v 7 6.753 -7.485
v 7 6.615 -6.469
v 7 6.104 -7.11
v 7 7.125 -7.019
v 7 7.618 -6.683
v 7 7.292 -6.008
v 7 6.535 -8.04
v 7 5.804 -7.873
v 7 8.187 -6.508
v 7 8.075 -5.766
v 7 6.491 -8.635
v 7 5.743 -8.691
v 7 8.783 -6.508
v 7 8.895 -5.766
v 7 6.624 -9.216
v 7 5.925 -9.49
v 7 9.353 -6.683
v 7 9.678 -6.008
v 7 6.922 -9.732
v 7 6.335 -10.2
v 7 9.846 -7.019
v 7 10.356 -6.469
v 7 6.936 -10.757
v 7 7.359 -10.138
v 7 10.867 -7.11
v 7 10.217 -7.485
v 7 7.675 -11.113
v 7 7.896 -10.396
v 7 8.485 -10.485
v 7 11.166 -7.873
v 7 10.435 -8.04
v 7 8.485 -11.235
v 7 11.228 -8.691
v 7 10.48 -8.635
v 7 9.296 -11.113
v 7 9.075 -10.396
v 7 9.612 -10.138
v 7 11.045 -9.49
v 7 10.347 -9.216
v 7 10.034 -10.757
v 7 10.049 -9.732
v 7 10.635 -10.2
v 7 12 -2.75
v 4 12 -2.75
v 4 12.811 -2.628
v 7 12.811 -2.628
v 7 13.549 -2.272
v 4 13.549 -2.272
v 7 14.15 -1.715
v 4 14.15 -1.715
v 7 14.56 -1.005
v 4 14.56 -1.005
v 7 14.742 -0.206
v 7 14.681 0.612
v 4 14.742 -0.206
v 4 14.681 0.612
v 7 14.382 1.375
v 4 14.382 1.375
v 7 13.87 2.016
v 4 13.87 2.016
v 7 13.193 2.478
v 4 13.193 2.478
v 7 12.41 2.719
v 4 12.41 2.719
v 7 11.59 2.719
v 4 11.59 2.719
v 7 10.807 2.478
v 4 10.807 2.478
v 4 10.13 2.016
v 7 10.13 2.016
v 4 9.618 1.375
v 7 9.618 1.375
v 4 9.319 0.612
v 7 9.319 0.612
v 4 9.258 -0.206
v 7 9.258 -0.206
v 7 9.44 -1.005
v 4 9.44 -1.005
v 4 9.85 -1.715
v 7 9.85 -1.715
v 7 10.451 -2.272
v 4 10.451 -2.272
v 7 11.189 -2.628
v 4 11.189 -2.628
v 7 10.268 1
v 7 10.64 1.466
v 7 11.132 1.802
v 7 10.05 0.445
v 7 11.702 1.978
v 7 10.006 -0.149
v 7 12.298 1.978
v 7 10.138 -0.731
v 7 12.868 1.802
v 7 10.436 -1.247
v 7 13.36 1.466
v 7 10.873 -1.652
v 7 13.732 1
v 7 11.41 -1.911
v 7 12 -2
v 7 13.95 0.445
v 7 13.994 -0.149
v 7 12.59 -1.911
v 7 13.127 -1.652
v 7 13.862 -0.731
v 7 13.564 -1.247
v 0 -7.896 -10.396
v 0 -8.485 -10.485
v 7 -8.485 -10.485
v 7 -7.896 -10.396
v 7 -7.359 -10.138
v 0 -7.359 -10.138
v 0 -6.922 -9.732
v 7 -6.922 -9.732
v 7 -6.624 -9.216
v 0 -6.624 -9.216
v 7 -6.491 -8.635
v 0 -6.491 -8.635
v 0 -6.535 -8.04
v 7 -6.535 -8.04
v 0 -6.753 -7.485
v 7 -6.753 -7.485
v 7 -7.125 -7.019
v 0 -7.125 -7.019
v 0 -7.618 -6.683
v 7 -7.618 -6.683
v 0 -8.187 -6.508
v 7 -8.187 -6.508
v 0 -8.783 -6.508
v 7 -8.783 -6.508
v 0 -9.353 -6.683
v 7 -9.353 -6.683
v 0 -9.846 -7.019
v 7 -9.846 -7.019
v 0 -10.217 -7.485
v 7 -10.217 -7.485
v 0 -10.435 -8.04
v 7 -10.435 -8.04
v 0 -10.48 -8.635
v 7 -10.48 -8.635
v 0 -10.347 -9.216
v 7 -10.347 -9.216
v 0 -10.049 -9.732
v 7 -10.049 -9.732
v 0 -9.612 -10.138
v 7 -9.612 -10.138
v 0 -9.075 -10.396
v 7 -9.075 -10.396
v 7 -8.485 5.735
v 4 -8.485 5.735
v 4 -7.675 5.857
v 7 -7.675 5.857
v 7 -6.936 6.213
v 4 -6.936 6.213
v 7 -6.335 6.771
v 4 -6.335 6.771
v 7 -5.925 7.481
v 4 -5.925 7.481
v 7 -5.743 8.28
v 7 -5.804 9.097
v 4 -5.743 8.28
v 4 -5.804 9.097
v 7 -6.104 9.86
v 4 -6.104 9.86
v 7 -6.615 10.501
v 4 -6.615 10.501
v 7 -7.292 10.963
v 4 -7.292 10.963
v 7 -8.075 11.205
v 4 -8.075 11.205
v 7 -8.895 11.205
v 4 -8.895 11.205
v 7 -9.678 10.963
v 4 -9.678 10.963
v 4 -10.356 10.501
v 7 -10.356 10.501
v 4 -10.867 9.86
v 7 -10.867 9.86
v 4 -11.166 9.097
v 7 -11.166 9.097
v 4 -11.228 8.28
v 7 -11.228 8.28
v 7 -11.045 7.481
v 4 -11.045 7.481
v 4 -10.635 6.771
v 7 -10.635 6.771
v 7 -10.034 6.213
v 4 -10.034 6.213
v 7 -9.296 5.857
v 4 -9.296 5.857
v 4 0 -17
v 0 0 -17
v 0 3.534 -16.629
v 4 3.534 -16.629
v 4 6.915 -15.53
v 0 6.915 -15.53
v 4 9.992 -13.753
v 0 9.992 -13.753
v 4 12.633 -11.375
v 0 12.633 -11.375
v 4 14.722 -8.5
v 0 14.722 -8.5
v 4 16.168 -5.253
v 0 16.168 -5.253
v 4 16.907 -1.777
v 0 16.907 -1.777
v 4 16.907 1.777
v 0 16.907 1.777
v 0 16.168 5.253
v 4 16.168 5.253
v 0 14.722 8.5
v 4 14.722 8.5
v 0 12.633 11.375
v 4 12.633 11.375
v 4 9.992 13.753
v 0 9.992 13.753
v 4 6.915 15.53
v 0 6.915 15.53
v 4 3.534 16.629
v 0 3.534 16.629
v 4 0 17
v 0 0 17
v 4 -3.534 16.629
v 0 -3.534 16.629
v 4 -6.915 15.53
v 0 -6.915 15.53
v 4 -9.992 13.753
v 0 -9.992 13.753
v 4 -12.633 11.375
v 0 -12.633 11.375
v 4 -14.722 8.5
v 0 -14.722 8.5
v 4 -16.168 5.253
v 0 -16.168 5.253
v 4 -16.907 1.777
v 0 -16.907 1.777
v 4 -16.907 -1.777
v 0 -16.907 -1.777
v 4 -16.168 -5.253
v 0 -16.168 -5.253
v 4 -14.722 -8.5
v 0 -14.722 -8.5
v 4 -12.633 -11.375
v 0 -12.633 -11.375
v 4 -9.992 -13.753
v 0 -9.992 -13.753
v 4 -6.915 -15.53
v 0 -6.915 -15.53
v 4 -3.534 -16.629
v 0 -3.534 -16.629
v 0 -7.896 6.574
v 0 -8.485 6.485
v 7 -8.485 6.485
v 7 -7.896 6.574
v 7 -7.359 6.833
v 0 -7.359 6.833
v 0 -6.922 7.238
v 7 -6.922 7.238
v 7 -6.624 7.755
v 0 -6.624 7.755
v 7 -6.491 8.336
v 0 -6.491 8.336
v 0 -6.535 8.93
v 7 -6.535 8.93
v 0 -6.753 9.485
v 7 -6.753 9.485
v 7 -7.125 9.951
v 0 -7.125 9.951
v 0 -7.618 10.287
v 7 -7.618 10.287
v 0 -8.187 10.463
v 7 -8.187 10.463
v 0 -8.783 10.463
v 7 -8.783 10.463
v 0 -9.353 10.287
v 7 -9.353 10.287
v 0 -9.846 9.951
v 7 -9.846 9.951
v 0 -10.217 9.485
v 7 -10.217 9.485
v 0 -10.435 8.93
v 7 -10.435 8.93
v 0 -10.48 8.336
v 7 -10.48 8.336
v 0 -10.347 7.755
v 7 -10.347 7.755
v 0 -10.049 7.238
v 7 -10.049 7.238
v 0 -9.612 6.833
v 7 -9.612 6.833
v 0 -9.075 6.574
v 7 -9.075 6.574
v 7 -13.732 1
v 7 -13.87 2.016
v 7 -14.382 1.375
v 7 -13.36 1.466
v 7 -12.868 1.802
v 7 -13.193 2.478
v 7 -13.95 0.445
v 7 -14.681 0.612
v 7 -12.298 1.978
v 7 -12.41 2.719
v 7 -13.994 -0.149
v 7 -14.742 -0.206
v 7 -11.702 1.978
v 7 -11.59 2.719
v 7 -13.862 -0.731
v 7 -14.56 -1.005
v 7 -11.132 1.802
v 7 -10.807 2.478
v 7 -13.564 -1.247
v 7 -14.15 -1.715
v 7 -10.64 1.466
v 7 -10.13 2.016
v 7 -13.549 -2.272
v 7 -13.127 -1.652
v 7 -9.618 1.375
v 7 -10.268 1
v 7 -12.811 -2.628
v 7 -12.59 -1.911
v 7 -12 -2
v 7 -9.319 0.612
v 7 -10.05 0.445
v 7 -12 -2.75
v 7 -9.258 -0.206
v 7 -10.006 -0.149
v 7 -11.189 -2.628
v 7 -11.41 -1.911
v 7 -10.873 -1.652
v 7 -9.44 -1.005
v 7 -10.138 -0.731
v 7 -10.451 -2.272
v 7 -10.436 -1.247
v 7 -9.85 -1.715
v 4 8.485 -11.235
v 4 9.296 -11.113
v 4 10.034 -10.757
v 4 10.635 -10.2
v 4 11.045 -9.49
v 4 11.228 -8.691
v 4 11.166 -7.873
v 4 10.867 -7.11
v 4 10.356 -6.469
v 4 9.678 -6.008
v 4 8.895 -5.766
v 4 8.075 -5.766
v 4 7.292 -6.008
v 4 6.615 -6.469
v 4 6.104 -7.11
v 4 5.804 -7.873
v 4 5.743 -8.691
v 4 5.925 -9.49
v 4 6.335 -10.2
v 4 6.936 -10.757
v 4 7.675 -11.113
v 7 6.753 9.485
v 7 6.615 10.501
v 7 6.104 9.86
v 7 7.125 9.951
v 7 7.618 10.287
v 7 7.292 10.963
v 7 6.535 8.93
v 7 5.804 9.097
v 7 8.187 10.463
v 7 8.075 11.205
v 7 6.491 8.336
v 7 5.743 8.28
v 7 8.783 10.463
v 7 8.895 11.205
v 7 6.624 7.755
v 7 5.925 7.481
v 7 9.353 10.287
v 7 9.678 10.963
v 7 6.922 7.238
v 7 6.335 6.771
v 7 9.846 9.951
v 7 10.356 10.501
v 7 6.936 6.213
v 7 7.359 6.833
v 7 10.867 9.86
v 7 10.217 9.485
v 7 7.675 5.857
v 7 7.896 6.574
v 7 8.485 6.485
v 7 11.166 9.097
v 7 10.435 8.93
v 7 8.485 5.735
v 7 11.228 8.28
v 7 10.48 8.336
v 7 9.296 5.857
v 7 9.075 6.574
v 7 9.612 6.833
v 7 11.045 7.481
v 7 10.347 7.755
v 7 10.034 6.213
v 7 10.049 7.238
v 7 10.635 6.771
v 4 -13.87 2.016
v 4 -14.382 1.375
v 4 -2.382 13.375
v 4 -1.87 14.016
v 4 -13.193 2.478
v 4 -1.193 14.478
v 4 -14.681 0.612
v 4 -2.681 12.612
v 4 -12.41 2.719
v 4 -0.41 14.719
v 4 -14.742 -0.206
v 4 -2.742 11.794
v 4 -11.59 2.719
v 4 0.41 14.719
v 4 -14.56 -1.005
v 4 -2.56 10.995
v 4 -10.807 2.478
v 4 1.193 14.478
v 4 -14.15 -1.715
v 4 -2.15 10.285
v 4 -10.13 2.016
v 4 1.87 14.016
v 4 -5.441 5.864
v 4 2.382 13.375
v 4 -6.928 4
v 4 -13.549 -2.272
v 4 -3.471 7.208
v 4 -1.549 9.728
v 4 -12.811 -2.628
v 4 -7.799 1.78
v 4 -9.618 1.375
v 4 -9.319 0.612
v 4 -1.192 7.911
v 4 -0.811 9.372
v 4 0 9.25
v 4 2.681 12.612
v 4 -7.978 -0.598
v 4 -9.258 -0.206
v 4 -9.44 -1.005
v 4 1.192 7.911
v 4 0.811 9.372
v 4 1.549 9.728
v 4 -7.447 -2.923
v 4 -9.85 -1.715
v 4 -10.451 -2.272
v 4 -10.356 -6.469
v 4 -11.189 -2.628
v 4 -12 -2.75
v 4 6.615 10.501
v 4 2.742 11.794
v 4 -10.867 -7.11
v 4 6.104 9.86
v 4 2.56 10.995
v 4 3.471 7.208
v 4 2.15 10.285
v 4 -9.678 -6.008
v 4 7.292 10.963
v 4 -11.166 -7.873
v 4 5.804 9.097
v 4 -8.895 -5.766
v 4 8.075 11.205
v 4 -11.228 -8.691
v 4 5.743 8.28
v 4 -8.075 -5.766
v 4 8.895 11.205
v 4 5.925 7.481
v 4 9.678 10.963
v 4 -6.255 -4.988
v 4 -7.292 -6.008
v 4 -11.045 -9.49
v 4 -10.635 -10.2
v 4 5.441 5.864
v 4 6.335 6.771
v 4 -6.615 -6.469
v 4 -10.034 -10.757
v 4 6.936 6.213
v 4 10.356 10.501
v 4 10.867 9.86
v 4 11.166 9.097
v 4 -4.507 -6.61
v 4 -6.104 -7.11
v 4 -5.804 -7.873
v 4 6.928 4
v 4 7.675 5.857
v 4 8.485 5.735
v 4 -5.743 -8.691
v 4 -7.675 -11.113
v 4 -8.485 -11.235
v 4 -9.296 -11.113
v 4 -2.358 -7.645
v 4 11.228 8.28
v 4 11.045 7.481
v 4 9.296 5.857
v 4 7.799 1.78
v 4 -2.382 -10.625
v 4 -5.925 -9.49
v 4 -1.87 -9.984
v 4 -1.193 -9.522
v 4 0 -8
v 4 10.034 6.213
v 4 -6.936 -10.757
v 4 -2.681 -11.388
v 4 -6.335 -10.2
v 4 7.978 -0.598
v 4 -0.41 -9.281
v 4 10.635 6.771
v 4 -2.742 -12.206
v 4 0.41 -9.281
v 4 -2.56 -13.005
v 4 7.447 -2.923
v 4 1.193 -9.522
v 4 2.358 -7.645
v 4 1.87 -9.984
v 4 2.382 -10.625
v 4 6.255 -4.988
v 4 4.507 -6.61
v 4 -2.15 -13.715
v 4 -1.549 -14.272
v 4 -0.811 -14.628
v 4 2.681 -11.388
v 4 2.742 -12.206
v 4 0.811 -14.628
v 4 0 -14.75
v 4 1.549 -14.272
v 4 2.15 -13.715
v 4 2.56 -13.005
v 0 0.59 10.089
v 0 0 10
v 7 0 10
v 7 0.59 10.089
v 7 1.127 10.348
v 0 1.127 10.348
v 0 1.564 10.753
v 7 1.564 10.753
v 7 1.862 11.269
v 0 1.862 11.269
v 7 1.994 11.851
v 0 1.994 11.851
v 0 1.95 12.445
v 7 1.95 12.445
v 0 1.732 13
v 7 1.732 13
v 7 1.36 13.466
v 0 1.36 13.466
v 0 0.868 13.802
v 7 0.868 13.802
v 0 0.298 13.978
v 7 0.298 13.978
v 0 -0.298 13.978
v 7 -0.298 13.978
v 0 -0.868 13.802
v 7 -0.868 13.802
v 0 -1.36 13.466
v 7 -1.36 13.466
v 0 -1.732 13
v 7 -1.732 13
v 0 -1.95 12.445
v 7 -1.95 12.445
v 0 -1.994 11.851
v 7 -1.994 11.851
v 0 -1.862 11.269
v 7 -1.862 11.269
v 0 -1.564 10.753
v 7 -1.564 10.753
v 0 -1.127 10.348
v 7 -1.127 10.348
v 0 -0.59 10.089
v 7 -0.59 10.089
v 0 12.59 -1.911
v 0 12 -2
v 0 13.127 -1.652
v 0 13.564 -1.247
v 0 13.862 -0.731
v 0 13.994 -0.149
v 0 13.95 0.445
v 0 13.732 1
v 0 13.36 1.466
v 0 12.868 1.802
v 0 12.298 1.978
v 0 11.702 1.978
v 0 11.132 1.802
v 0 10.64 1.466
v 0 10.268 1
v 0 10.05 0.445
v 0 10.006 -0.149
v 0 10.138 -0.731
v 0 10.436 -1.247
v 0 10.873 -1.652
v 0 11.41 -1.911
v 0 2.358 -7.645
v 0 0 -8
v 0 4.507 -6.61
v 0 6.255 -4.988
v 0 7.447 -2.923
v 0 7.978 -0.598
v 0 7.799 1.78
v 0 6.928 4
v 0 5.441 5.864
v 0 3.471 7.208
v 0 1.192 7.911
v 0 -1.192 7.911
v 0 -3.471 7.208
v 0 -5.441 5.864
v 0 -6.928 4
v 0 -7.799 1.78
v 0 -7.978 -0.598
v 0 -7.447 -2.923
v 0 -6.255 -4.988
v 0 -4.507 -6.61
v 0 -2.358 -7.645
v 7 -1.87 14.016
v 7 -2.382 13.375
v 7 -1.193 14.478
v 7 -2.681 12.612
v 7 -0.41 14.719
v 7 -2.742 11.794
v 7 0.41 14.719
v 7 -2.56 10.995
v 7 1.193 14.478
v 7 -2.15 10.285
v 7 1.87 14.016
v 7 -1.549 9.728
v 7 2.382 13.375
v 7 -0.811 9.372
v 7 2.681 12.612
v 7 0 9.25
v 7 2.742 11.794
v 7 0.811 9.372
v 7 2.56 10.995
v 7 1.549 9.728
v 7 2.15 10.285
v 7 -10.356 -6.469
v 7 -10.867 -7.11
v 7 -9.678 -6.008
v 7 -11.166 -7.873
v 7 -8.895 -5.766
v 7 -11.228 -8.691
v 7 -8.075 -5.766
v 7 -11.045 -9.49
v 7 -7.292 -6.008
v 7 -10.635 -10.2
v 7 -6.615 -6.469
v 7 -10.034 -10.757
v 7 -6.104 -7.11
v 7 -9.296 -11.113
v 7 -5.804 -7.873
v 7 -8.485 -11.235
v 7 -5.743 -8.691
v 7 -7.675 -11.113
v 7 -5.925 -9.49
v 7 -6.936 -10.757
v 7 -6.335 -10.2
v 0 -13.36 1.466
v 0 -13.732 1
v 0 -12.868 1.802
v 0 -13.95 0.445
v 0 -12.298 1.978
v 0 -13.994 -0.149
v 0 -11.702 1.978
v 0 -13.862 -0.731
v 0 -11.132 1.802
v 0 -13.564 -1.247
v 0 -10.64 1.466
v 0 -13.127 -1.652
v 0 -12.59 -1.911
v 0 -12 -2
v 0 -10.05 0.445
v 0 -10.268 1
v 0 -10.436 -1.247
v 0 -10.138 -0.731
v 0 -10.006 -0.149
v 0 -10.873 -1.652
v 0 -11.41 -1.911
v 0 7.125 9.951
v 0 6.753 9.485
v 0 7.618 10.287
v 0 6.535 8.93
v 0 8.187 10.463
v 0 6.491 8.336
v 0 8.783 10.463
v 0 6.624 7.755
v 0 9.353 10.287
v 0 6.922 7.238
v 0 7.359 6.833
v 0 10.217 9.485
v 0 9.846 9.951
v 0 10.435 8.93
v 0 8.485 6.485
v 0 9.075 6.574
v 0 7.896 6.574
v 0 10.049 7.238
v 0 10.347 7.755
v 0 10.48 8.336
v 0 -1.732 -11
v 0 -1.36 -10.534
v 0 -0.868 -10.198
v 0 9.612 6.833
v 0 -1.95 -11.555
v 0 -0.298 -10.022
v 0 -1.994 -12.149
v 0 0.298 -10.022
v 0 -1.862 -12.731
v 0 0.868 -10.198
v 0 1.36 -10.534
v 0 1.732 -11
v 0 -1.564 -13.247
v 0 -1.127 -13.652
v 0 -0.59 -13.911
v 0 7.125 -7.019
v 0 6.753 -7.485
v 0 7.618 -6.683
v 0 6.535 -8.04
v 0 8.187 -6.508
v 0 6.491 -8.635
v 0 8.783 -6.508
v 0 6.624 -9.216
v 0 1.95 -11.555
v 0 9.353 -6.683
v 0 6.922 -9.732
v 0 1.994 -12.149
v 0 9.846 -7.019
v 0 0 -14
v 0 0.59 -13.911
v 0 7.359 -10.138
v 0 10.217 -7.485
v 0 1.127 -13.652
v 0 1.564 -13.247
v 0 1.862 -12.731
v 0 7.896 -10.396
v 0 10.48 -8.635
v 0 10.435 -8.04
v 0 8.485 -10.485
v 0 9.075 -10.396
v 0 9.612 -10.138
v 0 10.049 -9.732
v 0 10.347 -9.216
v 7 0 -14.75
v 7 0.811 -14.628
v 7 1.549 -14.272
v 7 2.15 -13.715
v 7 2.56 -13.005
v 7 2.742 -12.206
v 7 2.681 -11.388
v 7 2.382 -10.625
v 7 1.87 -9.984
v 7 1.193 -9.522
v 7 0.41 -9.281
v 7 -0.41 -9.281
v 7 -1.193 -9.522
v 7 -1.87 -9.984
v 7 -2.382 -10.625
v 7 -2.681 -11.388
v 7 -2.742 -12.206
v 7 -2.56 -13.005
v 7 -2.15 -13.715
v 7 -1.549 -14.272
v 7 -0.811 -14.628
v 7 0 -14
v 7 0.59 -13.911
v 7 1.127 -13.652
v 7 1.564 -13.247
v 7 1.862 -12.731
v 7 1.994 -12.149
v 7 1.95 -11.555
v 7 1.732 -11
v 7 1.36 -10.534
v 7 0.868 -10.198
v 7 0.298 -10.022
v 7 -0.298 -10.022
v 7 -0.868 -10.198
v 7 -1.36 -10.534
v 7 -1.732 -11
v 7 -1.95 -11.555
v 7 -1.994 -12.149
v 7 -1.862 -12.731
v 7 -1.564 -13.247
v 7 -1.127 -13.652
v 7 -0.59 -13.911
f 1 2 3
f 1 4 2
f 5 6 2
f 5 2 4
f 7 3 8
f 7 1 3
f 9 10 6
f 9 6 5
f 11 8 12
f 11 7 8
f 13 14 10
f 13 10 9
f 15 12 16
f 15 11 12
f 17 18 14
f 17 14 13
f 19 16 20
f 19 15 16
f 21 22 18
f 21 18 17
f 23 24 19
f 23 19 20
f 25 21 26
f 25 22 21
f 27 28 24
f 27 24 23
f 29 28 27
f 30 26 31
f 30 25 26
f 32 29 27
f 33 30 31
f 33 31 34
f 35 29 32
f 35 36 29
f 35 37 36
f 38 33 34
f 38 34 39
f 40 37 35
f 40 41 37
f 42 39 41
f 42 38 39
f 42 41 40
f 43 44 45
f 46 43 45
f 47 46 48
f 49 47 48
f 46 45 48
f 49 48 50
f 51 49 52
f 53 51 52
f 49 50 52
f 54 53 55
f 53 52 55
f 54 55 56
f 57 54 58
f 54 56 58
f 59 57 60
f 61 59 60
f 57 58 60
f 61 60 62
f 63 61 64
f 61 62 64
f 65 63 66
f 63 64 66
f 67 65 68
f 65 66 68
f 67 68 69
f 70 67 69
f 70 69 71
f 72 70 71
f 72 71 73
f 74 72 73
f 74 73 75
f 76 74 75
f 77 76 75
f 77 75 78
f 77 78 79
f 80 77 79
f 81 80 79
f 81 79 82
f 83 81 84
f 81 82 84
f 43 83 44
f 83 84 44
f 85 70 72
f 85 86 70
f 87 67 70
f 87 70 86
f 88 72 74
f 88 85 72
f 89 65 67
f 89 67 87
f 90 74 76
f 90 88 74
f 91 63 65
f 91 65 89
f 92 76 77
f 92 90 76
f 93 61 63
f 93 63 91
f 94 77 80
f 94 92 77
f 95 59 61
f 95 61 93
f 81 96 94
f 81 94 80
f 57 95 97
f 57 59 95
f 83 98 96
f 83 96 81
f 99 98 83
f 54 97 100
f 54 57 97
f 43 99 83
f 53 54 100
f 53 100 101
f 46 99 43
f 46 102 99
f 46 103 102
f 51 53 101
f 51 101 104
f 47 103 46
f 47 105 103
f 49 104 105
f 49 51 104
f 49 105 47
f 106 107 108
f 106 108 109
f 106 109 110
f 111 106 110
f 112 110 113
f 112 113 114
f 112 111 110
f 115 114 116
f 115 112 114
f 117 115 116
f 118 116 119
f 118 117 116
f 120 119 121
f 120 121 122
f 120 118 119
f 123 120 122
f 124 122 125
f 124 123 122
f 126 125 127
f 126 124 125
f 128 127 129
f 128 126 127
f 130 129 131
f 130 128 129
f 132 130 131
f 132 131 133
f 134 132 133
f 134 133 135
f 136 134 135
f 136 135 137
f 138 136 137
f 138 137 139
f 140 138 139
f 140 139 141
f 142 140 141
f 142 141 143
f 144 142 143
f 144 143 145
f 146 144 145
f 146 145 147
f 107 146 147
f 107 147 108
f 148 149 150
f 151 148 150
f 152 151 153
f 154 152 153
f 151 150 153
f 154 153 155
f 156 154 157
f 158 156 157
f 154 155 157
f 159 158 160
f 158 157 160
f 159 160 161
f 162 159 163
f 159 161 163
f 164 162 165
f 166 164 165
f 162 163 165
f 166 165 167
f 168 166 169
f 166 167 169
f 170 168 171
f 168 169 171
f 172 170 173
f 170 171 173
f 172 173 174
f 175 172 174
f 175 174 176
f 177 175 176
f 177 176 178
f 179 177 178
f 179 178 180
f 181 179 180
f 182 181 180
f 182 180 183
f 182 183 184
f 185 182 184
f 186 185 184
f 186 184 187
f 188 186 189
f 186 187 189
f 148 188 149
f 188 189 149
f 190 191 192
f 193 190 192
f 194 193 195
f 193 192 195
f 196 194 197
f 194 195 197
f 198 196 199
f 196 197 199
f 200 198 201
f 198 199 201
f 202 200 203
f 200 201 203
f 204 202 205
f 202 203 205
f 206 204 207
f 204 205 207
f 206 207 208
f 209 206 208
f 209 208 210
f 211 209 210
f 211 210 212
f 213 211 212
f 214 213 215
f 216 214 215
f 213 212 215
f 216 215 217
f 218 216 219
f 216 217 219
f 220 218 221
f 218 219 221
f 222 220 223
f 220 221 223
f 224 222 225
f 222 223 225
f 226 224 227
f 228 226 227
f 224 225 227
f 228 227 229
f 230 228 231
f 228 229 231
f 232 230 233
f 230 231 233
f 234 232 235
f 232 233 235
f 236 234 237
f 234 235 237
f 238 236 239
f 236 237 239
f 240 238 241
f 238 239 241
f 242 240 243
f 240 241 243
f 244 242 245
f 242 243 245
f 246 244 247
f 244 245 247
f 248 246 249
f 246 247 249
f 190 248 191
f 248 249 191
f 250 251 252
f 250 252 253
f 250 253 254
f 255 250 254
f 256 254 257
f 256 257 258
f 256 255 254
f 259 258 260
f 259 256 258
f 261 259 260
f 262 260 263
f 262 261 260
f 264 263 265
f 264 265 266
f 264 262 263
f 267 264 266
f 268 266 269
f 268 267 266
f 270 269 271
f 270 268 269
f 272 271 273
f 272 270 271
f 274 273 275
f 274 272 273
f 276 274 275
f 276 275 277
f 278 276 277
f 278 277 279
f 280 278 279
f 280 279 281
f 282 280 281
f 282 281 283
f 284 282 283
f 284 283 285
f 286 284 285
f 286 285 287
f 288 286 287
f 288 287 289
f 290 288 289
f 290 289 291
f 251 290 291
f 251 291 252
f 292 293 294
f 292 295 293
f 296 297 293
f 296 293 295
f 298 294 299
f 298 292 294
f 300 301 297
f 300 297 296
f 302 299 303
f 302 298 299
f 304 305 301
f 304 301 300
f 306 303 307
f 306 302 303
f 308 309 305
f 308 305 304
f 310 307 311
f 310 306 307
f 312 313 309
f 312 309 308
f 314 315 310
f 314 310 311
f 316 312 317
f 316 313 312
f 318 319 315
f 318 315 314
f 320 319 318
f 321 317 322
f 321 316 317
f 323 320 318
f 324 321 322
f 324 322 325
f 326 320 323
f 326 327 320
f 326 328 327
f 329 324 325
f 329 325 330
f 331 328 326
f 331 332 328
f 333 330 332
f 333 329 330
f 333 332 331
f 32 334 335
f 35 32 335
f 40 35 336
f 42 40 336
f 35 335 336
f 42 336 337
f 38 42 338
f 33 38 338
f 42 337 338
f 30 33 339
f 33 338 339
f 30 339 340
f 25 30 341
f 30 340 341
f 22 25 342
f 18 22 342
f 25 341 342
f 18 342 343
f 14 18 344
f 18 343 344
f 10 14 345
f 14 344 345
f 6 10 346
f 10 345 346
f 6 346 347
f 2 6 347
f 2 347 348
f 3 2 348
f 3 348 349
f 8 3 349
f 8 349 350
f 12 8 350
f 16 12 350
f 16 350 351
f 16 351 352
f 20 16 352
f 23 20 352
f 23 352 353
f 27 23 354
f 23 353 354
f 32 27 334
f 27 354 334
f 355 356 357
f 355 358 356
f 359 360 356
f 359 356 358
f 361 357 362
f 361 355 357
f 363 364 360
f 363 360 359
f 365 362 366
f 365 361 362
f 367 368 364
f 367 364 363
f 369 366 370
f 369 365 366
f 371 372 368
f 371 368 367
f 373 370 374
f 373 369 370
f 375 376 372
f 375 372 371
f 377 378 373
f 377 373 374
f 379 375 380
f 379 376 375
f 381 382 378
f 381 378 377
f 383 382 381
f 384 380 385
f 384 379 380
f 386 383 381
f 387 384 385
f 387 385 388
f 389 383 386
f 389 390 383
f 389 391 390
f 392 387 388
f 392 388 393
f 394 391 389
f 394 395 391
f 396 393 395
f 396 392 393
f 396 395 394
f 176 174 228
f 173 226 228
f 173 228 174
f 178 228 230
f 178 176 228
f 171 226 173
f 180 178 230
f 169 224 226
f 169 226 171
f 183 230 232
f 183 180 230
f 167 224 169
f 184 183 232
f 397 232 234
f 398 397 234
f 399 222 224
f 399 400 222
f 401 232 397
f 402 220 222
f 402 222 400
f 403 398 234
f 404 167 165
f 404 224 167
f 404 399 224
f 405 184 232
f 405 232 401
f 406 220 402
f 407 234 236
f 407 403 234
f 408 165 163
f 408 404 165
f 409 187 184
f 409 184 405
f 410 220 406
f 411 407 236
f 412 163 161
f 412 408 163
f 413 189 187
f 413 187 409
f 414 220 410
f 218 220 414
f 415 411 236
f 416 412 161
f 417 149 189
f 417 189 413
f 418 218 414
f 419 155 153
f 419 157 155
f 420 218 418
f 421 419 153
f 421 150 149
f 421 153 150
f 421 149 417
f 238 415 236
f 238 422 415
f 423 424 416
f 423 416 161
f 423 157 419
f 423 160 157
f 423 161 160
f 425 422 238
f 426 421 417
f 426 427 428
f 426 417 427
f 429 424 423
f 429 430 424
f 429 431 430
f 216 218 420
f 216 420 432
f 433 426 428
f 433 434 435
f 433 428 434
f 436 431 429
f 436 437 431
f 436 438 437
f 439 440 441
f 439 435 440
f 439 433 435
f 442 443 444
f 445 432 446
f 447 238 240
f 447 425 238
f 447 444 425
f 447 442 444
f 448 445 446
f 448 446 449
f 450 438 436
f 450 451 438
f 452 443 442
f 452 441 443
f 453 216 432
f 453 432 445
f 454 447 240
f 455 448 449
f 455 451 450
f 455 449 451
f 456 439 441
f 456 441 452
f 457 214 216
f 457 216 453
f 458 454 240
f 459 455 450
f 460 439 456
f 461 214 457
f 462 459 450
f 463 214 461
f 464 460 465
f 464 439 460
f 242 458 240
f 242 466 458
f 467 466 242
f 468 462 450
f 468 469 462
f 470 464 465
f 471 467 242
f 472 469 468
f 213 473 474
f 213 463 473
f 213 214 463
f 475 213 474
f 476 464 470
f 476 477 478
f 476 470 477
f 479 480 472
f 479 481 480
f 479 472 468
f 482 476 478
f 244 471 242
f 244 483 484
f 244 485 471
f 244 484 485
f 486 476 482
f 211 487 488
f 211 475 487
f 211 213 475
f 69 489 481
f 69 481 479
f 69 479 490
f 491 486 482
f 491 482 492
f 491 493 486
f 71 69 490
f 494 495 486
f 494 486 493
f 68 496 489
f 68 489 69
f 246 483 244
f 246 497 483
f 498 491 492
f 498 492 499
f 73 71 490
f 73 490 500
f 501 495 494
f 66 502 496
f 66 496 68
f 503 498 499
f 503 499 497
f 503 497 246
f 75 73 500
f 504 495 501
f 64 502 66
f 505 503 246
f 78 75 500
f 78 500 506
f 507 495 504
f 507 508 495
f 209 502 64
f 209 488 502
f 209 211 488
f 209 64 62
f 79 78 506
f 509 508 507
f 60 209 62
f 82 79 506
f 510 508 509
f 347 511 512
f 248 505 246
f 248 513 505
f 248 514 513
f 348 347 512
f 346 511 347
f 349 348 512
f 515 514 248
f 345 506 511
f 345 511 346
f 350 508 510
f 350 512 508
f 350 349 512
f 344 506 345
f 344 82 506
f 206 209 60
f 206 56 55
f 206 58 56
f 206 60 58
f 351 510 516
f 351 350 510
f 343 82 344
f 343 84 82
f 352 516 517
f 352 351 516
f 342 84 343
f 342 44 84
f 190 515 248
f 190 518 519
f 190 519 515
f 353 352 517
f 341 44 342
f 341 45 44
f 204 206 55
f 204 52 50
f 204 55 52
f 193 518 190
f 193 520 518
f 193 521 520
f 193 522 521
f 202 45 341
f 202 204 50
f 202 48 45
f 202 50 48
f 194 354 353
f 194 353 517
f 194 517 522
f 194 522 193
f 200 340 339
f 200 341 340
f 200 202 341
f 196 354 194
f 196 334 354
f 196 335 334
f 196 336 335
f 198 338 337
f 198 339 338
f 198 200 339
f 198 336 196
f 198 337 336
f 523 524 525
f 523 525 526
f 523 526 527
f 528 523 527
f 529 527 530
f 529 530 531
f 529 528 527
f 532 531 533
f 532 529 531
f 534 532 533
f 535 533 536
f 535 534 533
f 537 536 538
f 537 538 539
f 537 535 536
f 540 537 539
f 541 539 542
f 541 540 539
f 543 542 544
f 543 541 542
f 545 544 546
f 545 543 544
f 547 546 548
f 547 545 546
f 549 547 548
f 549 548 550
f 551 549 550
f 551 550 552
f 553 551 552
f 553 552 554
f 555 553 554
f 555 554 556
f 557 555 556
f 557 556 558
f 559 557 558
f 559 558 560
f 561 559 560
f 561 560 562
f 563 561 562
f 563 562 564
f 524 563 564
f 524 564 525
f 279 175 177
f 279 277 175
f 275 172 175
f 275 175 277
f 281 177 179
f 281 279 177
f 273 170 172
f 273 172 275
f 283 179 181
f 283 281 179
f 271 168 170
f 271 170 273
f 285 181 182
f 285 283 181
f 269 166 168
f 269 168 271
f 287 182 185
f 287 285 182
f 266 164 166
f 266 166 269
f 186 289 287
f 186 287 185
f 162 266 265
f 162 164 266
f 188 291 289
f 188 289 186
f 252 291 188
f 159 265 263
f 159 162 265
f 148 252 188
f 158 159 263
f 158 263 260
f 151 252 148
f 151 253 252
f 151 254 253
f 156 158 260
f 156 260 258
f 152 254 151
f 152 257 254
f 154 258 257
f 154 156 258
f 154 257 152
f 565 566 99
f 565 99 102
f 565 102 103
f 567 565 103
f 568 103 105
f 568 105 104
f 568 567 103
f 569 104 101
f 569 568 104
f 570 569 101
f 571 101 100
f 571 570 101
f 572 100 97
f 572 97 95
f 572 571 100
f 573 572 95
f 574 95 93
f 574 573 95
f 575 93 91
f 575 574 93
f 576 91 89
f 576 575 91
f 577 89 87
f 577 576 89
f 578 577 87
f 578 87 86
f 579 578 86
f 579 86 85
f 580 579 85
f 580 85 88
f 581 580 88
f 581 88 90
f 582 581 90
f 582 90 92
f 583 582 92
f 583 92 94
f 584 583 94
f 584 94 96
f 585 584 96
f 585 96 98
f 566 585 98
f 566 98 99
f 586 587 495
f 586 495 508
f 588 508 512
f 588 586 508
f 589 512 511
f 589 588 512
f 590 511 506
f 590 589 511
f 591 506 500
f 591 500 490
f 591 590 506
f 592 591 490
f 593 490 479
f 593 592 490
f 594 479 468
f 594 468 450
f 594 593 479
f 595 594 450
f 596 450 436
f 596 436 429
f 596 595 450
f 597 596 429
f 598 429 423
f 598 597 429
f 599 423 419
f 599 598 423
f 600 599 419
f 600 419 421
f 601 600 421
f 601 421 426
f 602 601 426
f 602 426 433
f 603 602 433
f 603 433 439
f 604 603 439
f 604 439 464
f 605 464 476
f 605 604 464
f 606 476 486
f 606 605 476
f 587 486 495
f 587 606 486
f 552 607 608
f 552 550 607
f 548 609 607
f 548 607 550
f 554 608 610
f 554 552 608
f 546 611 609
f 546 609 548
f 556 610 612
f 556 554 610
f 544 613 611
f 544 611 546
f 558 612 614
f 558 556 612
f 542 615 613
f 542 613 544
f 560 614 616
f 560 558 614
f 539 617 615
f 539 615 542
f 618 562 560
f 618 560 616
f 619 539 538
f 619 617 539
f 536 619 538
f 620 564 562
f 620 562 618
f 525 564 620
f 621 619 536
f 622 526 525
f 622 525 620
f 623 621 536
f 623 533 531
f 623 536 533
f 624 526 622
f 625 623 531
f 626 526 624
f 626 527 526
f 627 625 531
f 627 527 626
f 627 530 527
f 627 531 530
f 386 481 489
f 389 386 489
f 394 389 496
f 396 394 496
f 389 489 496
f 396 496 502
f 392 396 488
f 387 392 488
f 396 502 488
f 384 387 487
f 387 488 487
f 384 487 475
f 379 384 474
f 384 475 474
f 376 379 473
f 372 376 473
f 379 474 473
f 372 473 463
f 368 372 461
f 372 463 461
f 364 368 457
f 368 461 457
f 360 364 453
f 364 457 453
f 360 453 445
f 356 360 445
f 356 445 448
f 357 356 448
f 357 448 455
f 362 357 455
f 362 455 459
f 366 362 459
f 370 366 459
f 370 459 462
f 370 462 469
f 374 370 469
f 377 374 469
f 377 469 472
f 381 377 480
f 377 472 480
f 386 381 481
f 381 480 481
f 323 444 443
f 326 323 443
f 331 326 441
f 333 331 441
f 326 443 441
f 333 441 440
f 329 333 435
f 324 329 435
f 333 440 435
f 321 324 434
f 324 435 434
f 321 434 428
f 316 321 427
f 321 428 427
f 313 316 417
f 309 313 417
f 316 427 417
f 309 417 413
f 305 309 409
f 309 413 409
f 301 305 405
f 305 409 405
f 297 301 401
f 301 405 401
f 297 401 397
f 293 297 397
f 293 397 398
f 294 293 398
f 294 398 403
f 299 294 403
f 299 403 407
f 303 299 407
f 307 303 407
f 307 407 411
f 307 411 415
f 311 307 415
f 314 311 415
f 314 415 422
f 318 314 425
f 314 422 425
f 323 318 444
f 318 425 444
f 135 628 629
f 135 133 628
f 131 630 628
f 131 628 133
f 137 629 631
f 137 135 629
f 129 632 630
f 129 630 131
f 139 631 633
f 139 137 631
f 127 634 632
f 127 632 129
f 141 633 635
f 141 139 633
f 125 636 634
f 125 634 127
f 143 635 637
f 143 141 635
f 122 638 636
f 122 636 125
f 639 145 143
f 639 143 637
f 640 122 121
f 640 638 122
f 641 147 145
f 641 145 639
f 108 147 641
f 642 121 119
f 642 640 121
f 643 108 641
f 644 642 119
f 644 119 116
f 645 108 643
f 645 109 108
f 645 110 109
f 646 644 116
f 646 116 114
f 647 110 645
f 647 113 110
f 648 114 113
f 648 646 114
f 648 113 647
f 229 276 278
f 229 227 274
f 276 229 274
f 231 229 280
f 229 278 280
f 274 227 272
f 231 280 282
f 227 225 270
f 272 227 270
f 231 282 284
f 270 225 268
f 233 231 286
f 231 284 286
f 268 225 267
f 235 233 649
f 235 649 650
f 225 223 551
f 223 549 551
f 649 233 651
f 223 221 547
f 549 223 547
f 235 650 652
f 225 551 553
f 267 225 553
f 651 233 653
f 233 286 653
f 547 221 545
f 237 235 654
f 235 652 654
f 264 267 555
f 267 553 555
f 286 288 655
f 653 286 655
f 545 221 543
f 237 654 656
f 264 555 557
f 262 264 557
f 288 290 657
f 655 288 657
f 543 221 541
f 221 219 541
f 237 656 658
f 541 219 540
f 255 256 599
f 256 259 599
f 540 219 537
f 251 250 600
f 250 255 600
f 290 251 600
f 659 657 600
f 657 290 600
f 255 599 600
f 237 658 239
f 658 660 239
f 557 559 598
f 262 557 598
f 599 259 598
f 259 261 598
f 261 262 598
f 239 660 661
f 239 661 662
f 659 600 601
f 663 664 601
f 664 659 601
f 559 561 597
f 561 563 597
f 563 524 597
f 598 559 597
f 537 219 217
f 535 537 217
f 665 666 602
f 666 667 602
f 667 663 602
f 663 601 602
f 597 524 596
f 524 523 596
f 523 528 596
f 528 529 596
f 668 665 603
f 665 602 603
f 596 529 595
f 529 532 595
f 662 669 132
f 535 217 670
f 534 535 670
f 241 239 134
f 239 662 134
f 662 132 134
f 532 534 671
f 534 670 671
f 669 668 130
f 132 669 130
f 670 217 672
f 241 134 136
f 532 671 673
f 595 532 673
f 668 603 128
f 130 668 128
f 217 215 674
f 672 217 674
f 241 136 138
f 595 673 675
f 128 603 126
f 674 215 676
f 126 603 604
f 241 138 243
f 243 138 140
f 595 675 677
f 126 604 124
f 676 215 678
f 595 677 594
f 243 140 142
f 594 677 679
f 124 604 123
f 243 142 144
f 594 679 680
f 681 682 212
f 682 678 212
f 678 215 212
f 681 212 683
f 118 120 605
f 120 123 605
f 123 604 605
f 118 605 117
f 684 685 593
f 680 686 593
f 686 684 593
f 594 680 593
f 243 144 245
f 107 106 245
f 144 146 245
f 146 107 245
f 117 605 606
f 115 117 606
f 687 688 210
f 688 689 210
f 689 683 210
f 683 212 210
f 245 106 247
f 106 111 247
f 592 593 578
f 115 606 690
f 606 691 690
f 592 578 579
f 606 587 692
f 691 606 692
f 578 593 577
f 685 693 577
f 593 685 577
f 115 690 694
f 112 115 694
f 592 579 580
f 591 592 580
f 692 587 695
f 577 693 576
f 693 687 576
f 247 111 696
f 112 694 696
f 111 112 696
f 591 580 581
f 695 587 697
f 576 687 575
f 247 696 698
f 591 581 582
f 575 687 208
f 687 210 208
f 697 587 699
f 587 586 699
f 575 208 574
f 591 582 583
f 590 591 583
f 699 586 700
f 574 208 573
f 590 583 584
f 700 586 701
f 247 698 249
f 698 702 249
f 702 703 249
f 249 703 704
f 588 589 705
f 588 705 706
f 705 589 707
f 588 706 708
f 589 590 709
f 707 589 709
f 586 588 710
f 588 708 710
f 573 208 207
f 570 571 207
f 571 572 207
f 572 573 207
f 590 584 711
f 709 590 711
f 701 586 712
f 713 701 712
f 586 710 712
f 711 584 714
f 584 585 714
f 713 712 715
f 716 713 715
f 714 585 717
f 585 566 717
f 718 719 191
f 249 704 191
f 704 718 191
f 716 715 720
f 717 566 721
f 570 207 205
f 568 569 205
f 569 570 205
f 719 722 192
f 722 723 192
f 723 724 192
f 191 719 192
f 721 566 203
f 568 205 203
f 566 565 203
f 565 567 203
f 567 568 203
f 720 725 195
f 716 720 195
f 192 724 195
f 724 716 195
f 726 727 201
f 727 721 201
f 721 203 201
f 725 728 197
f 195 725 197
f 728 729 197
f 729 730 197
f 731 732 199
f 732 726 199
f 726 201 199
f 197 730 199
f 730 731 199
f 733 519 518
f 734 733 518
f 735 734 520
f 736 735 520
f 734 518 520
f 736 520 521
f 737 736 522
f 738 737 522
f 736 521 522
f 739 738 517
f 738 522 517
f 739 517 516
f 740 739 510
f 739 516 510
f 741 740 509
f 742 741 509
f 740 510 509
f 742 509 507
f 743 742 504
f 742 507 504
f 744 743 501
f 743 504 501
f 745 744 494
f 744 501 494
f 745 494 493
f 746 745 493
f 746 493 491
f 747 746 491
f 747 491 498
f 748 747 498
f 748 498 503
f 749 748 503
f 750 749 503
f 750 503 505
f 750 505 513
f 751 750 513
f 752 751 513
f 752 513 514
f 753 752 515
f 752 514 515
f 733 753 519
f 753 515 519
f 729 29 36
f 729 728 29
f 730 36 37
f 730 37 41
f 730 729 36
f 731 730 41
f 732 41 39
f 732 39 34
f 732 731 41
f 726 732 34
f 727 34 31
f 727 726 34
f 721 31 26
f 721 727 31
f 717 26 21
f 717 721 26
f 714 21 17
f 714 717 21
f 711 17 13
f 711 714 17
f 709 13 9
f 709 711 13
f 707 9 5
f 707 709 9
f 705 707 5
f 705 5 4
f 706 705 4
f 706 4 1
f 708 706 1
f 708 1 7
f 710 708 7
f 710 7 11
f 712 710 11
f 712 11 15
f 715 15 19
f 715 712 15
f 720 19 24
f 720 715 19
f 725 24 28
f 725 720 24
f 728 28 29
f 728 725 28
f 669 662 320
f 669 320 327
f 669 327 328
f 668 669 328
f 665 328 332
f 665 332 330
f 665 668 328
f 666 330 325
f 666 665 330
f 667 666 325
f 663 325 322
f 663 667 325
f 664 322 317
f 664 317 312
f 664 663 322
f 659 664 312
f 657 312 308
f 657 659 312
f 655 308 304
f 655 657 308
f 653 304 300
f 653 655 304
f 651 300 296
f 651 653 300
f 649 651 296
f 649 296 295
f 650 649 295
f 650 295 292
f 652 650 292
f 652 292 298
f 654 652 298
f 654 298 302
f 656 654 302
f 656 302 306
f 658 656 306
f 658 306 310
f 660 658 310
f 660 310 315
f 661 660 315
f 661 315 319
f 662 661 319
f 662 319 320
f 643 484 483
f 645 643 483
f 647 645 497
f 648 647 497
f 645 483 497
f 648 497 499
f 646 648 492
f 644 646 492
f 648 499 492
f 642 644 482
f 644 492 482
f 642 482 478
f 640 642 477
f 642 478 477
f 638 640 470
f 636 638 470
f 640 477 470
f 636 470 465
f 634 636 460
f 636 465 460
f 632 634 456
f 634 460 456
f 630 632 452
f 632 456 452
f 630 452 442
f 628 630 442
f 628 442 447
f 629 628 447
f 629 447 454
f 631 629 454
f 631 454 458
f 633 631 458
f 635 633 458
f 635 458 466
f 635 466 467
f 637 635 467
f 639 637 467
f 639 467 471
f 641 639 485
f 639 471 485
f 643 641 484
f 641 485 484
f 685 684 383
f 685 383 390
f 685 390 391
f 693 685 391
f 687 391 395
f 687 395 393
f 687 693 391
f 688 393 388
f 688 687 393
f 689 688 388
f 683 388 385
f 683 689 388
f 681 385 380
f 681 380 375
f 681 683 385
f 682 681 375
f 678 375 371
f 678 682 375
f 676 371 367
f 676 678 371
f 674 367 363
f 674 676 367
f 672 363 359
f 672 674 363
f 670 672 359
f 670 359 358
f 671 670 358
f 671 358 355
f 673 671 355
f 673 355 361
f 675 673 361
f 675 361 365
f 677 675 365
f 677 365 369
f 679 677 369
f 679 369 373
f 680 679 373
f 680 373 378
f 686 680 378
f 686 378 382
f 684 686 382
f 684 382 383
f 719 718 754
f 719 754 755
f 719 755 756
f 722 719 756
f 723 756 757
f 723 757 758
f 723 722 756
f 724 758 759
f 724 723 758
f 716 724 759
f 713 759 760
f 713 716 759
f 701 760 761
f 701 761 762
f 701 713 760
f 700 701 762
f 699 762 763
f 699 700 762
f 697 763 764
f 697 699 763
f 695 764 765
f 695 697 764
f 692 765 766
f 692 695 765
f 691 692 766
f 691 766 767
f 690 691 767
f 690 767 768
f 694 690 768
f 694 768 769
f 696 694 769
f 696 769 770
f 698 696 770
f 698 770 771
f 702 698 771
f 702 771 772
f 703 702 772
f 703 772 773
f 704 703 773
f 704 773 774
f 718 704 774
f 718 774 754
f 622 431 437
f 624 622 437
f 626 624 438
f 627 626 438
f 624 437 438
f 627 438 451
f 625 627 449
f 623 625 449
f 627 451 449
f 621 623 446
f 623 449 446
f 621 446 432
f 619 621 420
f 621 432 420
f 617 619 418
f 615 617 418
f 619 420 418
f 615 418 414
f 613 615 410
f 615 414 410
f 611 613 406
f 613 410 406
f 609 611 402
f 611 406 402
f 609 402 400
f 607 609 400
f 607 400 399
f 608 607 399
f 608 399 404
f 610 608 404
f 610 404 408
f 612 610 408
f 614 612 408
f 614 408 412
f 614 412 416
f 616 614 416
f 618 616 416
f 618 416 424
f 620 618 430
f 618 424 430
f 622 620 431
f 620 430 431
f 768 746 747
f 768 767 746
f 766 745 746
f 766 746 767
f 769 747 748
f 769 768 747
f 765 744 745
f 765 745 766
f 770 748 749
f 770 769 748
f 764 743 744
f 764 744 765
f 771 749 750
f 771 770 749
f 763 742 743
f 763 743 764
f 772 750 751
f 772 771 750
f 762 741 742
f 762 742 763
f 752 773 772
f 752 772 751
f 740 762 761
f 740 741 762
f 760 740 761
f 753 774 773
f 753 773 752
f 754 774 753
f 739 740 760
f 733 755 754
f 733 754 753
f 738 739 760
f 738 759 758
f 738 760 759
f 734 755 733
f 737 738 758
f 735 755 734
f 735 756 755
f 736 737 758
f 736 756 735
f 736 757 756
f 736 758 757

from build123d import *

# Parameters (mm, degrees)
SKETCH1_R           = 17
SKETCH1_R_2         = 2
SKETCH1_R_3         = 8
BOSS_EXTRUDE1_DEPTH = 4
SKETCH2_R           = 2.75
SKETCH2_R_2         = 2
BOSS_EXTRUDE2_DEPTH = 3


with BuildPart() as part:
    # Sketch1 → Boss-Extrude1 (new body)
    with BuildSketch(Plane(origin=(0, 0, 0), x_dir=(0, 0, -1), z_dir=(1, 0, 0))):
        Circle(SKETCH1_R)
        with Locations((0, 12)):
            Circle(SKETCH1_R_2, mode=Mode.SUBTRACT)
        with Locations((8.485281374, 8.485281374)):
            Circle(SKETCH1_R_2, mode=Mode.SUBTRACT)
        with Locations((12, 0)):
            Circle(SKETCH1_R_2, mode=Mode.SUBTRACT)
        with Locations((8.485281374, -8.485281374)):
            Circle(SKETCH1_R_2, mode=Mode.SUBTRACT)
        with Locations((0, -12)):
            Circle(SKETCH1_R_2, mode=Mode.SUBTRACT)
        with Locations((-8.485281374, -8.485281374)):
            Circle(SKETCH1_R_2, mode=Mode.SUBTRACT)
        with Locations((-12, 0)):
            Circle(SKETCH1_R_2, mode=Mode.SUBTRACT)
        with Locations((-8.485281374, 8.485281374)):
            Circle(SKETCH1_R_2, mode=Mode.SUBTRACT)
        Circle(SKETCH1_R_3, mode=Mode.SUBTRACT)
    extrude(amount=BOSS_EXTRUDE1_DEPTH)

    # Sketch2 → Boss-Extrude2 (add)
    # profile 1 of 8: a face of its own
    with BuildSketch(Plane(origin=(4, 0, 0), x_dir=(0, 0, -1), z_dir=(1, 0, 0))):
        with Locations((8.485281374, 8.485281374)):
            Circle(SKETCH2_R)
        with Locations((8.485281374, 8.485281374)):
            Circle(SKETCH2_R_2, mode=Mode.SUBTRACT)
    # profile 2 of 8: a face of its own
    with BuildSketch(Plane(origin=(4, 0, 0), x_dir=(0, 0, -1), z_dir=(1, 0, 0))):
        with Locations((12, 0)):
            Circle(SKETCH2_R)
        with Locations((12, 0)):
            Circle(SKETCH2_R_2, mode=Mode.SUBTRACT)
    # profile 3 of 8: a face of its own
    with BuildSketch(Plane(origin=(4, 0, 0), x_dir=(0, 0, -1), z_dir=(1, 0, 0))):
        with Locations((8.485281374, -8.485281374)):
            Circle(SKETCH2_R)
        with Locations((8.485281374, -8.485281374)):
            Circle(SKETCH2_R_2, mode=Mode.SUBTRACT)
    # profile 4 of 8: a face of its own
    with BuildSketch(Plane(origin=(4, 0, 0), x_dir=(0, 0, -1), z_dir=(1, 0, 0))):
        with Locations((0, -12)):
            Circle(SKETCH2_R)
        with Locations((0, -12)):
            Circle(SKETCH2_R_2, mode=Mode.SUBTRACT)
    # profile 5 of 8: a face of its own
    with BuildSketch(Plane(origin=(4, 0, 0), x_dir=(0, 0, -1), z_dir=(1, 0, 0))):
        with Locations((-8.485281374, -8.485281374)):
            Circle(SKETCH2_R)
        with Locations((-8.485281374, -8.485281374)):
            Circle(SKETCH2_R_2, mode=Mode.SUBTRACT)
    # profile 6 of 8: a face of its own
    with BuildSketch(Plane(origin=(4, 0, 0), x_dir=(0, 0, -1), z_dir=(1, 0, 0))):
        with Locations((-12, 0)):
            Circle(SKETCH2_R)
        with Locations((-12, 0)):
            Circle(SKETCH2_R_2, mode=Mode.SUBTRACT)
    # profile 7 of 8: a face of its own
    with BuildSketch(Plane(origin=(4, 0, 0), x_dir=(0, 0, -1), z_dir=(1, 0, 0))):
        with Locations((-8.485281374, 8.485281374)):
            Circle(SKETCH2_R)
        with Locations((-8.485281374, 8.485281374)):
            Circle(SKETCH2_R_2, mode=Mode.SUBTRACT)
    # profile 8 of 8: a face of its own
    with BuildSketch(Plane(origin=(4, 0, 0), x_dir=(0, 0, -1), z_dir=(1, 0, 0))):
        with Locations((0, 12)):
            Circle(SKETCH2_R)
        with Locations((0, 12)):
            Circle(SKETCH2_R_2, mode=Mode.SUBTRACT)
    extrude(amount=BOSS_EXTRUDE2_DEPTH)


solid = part.part
